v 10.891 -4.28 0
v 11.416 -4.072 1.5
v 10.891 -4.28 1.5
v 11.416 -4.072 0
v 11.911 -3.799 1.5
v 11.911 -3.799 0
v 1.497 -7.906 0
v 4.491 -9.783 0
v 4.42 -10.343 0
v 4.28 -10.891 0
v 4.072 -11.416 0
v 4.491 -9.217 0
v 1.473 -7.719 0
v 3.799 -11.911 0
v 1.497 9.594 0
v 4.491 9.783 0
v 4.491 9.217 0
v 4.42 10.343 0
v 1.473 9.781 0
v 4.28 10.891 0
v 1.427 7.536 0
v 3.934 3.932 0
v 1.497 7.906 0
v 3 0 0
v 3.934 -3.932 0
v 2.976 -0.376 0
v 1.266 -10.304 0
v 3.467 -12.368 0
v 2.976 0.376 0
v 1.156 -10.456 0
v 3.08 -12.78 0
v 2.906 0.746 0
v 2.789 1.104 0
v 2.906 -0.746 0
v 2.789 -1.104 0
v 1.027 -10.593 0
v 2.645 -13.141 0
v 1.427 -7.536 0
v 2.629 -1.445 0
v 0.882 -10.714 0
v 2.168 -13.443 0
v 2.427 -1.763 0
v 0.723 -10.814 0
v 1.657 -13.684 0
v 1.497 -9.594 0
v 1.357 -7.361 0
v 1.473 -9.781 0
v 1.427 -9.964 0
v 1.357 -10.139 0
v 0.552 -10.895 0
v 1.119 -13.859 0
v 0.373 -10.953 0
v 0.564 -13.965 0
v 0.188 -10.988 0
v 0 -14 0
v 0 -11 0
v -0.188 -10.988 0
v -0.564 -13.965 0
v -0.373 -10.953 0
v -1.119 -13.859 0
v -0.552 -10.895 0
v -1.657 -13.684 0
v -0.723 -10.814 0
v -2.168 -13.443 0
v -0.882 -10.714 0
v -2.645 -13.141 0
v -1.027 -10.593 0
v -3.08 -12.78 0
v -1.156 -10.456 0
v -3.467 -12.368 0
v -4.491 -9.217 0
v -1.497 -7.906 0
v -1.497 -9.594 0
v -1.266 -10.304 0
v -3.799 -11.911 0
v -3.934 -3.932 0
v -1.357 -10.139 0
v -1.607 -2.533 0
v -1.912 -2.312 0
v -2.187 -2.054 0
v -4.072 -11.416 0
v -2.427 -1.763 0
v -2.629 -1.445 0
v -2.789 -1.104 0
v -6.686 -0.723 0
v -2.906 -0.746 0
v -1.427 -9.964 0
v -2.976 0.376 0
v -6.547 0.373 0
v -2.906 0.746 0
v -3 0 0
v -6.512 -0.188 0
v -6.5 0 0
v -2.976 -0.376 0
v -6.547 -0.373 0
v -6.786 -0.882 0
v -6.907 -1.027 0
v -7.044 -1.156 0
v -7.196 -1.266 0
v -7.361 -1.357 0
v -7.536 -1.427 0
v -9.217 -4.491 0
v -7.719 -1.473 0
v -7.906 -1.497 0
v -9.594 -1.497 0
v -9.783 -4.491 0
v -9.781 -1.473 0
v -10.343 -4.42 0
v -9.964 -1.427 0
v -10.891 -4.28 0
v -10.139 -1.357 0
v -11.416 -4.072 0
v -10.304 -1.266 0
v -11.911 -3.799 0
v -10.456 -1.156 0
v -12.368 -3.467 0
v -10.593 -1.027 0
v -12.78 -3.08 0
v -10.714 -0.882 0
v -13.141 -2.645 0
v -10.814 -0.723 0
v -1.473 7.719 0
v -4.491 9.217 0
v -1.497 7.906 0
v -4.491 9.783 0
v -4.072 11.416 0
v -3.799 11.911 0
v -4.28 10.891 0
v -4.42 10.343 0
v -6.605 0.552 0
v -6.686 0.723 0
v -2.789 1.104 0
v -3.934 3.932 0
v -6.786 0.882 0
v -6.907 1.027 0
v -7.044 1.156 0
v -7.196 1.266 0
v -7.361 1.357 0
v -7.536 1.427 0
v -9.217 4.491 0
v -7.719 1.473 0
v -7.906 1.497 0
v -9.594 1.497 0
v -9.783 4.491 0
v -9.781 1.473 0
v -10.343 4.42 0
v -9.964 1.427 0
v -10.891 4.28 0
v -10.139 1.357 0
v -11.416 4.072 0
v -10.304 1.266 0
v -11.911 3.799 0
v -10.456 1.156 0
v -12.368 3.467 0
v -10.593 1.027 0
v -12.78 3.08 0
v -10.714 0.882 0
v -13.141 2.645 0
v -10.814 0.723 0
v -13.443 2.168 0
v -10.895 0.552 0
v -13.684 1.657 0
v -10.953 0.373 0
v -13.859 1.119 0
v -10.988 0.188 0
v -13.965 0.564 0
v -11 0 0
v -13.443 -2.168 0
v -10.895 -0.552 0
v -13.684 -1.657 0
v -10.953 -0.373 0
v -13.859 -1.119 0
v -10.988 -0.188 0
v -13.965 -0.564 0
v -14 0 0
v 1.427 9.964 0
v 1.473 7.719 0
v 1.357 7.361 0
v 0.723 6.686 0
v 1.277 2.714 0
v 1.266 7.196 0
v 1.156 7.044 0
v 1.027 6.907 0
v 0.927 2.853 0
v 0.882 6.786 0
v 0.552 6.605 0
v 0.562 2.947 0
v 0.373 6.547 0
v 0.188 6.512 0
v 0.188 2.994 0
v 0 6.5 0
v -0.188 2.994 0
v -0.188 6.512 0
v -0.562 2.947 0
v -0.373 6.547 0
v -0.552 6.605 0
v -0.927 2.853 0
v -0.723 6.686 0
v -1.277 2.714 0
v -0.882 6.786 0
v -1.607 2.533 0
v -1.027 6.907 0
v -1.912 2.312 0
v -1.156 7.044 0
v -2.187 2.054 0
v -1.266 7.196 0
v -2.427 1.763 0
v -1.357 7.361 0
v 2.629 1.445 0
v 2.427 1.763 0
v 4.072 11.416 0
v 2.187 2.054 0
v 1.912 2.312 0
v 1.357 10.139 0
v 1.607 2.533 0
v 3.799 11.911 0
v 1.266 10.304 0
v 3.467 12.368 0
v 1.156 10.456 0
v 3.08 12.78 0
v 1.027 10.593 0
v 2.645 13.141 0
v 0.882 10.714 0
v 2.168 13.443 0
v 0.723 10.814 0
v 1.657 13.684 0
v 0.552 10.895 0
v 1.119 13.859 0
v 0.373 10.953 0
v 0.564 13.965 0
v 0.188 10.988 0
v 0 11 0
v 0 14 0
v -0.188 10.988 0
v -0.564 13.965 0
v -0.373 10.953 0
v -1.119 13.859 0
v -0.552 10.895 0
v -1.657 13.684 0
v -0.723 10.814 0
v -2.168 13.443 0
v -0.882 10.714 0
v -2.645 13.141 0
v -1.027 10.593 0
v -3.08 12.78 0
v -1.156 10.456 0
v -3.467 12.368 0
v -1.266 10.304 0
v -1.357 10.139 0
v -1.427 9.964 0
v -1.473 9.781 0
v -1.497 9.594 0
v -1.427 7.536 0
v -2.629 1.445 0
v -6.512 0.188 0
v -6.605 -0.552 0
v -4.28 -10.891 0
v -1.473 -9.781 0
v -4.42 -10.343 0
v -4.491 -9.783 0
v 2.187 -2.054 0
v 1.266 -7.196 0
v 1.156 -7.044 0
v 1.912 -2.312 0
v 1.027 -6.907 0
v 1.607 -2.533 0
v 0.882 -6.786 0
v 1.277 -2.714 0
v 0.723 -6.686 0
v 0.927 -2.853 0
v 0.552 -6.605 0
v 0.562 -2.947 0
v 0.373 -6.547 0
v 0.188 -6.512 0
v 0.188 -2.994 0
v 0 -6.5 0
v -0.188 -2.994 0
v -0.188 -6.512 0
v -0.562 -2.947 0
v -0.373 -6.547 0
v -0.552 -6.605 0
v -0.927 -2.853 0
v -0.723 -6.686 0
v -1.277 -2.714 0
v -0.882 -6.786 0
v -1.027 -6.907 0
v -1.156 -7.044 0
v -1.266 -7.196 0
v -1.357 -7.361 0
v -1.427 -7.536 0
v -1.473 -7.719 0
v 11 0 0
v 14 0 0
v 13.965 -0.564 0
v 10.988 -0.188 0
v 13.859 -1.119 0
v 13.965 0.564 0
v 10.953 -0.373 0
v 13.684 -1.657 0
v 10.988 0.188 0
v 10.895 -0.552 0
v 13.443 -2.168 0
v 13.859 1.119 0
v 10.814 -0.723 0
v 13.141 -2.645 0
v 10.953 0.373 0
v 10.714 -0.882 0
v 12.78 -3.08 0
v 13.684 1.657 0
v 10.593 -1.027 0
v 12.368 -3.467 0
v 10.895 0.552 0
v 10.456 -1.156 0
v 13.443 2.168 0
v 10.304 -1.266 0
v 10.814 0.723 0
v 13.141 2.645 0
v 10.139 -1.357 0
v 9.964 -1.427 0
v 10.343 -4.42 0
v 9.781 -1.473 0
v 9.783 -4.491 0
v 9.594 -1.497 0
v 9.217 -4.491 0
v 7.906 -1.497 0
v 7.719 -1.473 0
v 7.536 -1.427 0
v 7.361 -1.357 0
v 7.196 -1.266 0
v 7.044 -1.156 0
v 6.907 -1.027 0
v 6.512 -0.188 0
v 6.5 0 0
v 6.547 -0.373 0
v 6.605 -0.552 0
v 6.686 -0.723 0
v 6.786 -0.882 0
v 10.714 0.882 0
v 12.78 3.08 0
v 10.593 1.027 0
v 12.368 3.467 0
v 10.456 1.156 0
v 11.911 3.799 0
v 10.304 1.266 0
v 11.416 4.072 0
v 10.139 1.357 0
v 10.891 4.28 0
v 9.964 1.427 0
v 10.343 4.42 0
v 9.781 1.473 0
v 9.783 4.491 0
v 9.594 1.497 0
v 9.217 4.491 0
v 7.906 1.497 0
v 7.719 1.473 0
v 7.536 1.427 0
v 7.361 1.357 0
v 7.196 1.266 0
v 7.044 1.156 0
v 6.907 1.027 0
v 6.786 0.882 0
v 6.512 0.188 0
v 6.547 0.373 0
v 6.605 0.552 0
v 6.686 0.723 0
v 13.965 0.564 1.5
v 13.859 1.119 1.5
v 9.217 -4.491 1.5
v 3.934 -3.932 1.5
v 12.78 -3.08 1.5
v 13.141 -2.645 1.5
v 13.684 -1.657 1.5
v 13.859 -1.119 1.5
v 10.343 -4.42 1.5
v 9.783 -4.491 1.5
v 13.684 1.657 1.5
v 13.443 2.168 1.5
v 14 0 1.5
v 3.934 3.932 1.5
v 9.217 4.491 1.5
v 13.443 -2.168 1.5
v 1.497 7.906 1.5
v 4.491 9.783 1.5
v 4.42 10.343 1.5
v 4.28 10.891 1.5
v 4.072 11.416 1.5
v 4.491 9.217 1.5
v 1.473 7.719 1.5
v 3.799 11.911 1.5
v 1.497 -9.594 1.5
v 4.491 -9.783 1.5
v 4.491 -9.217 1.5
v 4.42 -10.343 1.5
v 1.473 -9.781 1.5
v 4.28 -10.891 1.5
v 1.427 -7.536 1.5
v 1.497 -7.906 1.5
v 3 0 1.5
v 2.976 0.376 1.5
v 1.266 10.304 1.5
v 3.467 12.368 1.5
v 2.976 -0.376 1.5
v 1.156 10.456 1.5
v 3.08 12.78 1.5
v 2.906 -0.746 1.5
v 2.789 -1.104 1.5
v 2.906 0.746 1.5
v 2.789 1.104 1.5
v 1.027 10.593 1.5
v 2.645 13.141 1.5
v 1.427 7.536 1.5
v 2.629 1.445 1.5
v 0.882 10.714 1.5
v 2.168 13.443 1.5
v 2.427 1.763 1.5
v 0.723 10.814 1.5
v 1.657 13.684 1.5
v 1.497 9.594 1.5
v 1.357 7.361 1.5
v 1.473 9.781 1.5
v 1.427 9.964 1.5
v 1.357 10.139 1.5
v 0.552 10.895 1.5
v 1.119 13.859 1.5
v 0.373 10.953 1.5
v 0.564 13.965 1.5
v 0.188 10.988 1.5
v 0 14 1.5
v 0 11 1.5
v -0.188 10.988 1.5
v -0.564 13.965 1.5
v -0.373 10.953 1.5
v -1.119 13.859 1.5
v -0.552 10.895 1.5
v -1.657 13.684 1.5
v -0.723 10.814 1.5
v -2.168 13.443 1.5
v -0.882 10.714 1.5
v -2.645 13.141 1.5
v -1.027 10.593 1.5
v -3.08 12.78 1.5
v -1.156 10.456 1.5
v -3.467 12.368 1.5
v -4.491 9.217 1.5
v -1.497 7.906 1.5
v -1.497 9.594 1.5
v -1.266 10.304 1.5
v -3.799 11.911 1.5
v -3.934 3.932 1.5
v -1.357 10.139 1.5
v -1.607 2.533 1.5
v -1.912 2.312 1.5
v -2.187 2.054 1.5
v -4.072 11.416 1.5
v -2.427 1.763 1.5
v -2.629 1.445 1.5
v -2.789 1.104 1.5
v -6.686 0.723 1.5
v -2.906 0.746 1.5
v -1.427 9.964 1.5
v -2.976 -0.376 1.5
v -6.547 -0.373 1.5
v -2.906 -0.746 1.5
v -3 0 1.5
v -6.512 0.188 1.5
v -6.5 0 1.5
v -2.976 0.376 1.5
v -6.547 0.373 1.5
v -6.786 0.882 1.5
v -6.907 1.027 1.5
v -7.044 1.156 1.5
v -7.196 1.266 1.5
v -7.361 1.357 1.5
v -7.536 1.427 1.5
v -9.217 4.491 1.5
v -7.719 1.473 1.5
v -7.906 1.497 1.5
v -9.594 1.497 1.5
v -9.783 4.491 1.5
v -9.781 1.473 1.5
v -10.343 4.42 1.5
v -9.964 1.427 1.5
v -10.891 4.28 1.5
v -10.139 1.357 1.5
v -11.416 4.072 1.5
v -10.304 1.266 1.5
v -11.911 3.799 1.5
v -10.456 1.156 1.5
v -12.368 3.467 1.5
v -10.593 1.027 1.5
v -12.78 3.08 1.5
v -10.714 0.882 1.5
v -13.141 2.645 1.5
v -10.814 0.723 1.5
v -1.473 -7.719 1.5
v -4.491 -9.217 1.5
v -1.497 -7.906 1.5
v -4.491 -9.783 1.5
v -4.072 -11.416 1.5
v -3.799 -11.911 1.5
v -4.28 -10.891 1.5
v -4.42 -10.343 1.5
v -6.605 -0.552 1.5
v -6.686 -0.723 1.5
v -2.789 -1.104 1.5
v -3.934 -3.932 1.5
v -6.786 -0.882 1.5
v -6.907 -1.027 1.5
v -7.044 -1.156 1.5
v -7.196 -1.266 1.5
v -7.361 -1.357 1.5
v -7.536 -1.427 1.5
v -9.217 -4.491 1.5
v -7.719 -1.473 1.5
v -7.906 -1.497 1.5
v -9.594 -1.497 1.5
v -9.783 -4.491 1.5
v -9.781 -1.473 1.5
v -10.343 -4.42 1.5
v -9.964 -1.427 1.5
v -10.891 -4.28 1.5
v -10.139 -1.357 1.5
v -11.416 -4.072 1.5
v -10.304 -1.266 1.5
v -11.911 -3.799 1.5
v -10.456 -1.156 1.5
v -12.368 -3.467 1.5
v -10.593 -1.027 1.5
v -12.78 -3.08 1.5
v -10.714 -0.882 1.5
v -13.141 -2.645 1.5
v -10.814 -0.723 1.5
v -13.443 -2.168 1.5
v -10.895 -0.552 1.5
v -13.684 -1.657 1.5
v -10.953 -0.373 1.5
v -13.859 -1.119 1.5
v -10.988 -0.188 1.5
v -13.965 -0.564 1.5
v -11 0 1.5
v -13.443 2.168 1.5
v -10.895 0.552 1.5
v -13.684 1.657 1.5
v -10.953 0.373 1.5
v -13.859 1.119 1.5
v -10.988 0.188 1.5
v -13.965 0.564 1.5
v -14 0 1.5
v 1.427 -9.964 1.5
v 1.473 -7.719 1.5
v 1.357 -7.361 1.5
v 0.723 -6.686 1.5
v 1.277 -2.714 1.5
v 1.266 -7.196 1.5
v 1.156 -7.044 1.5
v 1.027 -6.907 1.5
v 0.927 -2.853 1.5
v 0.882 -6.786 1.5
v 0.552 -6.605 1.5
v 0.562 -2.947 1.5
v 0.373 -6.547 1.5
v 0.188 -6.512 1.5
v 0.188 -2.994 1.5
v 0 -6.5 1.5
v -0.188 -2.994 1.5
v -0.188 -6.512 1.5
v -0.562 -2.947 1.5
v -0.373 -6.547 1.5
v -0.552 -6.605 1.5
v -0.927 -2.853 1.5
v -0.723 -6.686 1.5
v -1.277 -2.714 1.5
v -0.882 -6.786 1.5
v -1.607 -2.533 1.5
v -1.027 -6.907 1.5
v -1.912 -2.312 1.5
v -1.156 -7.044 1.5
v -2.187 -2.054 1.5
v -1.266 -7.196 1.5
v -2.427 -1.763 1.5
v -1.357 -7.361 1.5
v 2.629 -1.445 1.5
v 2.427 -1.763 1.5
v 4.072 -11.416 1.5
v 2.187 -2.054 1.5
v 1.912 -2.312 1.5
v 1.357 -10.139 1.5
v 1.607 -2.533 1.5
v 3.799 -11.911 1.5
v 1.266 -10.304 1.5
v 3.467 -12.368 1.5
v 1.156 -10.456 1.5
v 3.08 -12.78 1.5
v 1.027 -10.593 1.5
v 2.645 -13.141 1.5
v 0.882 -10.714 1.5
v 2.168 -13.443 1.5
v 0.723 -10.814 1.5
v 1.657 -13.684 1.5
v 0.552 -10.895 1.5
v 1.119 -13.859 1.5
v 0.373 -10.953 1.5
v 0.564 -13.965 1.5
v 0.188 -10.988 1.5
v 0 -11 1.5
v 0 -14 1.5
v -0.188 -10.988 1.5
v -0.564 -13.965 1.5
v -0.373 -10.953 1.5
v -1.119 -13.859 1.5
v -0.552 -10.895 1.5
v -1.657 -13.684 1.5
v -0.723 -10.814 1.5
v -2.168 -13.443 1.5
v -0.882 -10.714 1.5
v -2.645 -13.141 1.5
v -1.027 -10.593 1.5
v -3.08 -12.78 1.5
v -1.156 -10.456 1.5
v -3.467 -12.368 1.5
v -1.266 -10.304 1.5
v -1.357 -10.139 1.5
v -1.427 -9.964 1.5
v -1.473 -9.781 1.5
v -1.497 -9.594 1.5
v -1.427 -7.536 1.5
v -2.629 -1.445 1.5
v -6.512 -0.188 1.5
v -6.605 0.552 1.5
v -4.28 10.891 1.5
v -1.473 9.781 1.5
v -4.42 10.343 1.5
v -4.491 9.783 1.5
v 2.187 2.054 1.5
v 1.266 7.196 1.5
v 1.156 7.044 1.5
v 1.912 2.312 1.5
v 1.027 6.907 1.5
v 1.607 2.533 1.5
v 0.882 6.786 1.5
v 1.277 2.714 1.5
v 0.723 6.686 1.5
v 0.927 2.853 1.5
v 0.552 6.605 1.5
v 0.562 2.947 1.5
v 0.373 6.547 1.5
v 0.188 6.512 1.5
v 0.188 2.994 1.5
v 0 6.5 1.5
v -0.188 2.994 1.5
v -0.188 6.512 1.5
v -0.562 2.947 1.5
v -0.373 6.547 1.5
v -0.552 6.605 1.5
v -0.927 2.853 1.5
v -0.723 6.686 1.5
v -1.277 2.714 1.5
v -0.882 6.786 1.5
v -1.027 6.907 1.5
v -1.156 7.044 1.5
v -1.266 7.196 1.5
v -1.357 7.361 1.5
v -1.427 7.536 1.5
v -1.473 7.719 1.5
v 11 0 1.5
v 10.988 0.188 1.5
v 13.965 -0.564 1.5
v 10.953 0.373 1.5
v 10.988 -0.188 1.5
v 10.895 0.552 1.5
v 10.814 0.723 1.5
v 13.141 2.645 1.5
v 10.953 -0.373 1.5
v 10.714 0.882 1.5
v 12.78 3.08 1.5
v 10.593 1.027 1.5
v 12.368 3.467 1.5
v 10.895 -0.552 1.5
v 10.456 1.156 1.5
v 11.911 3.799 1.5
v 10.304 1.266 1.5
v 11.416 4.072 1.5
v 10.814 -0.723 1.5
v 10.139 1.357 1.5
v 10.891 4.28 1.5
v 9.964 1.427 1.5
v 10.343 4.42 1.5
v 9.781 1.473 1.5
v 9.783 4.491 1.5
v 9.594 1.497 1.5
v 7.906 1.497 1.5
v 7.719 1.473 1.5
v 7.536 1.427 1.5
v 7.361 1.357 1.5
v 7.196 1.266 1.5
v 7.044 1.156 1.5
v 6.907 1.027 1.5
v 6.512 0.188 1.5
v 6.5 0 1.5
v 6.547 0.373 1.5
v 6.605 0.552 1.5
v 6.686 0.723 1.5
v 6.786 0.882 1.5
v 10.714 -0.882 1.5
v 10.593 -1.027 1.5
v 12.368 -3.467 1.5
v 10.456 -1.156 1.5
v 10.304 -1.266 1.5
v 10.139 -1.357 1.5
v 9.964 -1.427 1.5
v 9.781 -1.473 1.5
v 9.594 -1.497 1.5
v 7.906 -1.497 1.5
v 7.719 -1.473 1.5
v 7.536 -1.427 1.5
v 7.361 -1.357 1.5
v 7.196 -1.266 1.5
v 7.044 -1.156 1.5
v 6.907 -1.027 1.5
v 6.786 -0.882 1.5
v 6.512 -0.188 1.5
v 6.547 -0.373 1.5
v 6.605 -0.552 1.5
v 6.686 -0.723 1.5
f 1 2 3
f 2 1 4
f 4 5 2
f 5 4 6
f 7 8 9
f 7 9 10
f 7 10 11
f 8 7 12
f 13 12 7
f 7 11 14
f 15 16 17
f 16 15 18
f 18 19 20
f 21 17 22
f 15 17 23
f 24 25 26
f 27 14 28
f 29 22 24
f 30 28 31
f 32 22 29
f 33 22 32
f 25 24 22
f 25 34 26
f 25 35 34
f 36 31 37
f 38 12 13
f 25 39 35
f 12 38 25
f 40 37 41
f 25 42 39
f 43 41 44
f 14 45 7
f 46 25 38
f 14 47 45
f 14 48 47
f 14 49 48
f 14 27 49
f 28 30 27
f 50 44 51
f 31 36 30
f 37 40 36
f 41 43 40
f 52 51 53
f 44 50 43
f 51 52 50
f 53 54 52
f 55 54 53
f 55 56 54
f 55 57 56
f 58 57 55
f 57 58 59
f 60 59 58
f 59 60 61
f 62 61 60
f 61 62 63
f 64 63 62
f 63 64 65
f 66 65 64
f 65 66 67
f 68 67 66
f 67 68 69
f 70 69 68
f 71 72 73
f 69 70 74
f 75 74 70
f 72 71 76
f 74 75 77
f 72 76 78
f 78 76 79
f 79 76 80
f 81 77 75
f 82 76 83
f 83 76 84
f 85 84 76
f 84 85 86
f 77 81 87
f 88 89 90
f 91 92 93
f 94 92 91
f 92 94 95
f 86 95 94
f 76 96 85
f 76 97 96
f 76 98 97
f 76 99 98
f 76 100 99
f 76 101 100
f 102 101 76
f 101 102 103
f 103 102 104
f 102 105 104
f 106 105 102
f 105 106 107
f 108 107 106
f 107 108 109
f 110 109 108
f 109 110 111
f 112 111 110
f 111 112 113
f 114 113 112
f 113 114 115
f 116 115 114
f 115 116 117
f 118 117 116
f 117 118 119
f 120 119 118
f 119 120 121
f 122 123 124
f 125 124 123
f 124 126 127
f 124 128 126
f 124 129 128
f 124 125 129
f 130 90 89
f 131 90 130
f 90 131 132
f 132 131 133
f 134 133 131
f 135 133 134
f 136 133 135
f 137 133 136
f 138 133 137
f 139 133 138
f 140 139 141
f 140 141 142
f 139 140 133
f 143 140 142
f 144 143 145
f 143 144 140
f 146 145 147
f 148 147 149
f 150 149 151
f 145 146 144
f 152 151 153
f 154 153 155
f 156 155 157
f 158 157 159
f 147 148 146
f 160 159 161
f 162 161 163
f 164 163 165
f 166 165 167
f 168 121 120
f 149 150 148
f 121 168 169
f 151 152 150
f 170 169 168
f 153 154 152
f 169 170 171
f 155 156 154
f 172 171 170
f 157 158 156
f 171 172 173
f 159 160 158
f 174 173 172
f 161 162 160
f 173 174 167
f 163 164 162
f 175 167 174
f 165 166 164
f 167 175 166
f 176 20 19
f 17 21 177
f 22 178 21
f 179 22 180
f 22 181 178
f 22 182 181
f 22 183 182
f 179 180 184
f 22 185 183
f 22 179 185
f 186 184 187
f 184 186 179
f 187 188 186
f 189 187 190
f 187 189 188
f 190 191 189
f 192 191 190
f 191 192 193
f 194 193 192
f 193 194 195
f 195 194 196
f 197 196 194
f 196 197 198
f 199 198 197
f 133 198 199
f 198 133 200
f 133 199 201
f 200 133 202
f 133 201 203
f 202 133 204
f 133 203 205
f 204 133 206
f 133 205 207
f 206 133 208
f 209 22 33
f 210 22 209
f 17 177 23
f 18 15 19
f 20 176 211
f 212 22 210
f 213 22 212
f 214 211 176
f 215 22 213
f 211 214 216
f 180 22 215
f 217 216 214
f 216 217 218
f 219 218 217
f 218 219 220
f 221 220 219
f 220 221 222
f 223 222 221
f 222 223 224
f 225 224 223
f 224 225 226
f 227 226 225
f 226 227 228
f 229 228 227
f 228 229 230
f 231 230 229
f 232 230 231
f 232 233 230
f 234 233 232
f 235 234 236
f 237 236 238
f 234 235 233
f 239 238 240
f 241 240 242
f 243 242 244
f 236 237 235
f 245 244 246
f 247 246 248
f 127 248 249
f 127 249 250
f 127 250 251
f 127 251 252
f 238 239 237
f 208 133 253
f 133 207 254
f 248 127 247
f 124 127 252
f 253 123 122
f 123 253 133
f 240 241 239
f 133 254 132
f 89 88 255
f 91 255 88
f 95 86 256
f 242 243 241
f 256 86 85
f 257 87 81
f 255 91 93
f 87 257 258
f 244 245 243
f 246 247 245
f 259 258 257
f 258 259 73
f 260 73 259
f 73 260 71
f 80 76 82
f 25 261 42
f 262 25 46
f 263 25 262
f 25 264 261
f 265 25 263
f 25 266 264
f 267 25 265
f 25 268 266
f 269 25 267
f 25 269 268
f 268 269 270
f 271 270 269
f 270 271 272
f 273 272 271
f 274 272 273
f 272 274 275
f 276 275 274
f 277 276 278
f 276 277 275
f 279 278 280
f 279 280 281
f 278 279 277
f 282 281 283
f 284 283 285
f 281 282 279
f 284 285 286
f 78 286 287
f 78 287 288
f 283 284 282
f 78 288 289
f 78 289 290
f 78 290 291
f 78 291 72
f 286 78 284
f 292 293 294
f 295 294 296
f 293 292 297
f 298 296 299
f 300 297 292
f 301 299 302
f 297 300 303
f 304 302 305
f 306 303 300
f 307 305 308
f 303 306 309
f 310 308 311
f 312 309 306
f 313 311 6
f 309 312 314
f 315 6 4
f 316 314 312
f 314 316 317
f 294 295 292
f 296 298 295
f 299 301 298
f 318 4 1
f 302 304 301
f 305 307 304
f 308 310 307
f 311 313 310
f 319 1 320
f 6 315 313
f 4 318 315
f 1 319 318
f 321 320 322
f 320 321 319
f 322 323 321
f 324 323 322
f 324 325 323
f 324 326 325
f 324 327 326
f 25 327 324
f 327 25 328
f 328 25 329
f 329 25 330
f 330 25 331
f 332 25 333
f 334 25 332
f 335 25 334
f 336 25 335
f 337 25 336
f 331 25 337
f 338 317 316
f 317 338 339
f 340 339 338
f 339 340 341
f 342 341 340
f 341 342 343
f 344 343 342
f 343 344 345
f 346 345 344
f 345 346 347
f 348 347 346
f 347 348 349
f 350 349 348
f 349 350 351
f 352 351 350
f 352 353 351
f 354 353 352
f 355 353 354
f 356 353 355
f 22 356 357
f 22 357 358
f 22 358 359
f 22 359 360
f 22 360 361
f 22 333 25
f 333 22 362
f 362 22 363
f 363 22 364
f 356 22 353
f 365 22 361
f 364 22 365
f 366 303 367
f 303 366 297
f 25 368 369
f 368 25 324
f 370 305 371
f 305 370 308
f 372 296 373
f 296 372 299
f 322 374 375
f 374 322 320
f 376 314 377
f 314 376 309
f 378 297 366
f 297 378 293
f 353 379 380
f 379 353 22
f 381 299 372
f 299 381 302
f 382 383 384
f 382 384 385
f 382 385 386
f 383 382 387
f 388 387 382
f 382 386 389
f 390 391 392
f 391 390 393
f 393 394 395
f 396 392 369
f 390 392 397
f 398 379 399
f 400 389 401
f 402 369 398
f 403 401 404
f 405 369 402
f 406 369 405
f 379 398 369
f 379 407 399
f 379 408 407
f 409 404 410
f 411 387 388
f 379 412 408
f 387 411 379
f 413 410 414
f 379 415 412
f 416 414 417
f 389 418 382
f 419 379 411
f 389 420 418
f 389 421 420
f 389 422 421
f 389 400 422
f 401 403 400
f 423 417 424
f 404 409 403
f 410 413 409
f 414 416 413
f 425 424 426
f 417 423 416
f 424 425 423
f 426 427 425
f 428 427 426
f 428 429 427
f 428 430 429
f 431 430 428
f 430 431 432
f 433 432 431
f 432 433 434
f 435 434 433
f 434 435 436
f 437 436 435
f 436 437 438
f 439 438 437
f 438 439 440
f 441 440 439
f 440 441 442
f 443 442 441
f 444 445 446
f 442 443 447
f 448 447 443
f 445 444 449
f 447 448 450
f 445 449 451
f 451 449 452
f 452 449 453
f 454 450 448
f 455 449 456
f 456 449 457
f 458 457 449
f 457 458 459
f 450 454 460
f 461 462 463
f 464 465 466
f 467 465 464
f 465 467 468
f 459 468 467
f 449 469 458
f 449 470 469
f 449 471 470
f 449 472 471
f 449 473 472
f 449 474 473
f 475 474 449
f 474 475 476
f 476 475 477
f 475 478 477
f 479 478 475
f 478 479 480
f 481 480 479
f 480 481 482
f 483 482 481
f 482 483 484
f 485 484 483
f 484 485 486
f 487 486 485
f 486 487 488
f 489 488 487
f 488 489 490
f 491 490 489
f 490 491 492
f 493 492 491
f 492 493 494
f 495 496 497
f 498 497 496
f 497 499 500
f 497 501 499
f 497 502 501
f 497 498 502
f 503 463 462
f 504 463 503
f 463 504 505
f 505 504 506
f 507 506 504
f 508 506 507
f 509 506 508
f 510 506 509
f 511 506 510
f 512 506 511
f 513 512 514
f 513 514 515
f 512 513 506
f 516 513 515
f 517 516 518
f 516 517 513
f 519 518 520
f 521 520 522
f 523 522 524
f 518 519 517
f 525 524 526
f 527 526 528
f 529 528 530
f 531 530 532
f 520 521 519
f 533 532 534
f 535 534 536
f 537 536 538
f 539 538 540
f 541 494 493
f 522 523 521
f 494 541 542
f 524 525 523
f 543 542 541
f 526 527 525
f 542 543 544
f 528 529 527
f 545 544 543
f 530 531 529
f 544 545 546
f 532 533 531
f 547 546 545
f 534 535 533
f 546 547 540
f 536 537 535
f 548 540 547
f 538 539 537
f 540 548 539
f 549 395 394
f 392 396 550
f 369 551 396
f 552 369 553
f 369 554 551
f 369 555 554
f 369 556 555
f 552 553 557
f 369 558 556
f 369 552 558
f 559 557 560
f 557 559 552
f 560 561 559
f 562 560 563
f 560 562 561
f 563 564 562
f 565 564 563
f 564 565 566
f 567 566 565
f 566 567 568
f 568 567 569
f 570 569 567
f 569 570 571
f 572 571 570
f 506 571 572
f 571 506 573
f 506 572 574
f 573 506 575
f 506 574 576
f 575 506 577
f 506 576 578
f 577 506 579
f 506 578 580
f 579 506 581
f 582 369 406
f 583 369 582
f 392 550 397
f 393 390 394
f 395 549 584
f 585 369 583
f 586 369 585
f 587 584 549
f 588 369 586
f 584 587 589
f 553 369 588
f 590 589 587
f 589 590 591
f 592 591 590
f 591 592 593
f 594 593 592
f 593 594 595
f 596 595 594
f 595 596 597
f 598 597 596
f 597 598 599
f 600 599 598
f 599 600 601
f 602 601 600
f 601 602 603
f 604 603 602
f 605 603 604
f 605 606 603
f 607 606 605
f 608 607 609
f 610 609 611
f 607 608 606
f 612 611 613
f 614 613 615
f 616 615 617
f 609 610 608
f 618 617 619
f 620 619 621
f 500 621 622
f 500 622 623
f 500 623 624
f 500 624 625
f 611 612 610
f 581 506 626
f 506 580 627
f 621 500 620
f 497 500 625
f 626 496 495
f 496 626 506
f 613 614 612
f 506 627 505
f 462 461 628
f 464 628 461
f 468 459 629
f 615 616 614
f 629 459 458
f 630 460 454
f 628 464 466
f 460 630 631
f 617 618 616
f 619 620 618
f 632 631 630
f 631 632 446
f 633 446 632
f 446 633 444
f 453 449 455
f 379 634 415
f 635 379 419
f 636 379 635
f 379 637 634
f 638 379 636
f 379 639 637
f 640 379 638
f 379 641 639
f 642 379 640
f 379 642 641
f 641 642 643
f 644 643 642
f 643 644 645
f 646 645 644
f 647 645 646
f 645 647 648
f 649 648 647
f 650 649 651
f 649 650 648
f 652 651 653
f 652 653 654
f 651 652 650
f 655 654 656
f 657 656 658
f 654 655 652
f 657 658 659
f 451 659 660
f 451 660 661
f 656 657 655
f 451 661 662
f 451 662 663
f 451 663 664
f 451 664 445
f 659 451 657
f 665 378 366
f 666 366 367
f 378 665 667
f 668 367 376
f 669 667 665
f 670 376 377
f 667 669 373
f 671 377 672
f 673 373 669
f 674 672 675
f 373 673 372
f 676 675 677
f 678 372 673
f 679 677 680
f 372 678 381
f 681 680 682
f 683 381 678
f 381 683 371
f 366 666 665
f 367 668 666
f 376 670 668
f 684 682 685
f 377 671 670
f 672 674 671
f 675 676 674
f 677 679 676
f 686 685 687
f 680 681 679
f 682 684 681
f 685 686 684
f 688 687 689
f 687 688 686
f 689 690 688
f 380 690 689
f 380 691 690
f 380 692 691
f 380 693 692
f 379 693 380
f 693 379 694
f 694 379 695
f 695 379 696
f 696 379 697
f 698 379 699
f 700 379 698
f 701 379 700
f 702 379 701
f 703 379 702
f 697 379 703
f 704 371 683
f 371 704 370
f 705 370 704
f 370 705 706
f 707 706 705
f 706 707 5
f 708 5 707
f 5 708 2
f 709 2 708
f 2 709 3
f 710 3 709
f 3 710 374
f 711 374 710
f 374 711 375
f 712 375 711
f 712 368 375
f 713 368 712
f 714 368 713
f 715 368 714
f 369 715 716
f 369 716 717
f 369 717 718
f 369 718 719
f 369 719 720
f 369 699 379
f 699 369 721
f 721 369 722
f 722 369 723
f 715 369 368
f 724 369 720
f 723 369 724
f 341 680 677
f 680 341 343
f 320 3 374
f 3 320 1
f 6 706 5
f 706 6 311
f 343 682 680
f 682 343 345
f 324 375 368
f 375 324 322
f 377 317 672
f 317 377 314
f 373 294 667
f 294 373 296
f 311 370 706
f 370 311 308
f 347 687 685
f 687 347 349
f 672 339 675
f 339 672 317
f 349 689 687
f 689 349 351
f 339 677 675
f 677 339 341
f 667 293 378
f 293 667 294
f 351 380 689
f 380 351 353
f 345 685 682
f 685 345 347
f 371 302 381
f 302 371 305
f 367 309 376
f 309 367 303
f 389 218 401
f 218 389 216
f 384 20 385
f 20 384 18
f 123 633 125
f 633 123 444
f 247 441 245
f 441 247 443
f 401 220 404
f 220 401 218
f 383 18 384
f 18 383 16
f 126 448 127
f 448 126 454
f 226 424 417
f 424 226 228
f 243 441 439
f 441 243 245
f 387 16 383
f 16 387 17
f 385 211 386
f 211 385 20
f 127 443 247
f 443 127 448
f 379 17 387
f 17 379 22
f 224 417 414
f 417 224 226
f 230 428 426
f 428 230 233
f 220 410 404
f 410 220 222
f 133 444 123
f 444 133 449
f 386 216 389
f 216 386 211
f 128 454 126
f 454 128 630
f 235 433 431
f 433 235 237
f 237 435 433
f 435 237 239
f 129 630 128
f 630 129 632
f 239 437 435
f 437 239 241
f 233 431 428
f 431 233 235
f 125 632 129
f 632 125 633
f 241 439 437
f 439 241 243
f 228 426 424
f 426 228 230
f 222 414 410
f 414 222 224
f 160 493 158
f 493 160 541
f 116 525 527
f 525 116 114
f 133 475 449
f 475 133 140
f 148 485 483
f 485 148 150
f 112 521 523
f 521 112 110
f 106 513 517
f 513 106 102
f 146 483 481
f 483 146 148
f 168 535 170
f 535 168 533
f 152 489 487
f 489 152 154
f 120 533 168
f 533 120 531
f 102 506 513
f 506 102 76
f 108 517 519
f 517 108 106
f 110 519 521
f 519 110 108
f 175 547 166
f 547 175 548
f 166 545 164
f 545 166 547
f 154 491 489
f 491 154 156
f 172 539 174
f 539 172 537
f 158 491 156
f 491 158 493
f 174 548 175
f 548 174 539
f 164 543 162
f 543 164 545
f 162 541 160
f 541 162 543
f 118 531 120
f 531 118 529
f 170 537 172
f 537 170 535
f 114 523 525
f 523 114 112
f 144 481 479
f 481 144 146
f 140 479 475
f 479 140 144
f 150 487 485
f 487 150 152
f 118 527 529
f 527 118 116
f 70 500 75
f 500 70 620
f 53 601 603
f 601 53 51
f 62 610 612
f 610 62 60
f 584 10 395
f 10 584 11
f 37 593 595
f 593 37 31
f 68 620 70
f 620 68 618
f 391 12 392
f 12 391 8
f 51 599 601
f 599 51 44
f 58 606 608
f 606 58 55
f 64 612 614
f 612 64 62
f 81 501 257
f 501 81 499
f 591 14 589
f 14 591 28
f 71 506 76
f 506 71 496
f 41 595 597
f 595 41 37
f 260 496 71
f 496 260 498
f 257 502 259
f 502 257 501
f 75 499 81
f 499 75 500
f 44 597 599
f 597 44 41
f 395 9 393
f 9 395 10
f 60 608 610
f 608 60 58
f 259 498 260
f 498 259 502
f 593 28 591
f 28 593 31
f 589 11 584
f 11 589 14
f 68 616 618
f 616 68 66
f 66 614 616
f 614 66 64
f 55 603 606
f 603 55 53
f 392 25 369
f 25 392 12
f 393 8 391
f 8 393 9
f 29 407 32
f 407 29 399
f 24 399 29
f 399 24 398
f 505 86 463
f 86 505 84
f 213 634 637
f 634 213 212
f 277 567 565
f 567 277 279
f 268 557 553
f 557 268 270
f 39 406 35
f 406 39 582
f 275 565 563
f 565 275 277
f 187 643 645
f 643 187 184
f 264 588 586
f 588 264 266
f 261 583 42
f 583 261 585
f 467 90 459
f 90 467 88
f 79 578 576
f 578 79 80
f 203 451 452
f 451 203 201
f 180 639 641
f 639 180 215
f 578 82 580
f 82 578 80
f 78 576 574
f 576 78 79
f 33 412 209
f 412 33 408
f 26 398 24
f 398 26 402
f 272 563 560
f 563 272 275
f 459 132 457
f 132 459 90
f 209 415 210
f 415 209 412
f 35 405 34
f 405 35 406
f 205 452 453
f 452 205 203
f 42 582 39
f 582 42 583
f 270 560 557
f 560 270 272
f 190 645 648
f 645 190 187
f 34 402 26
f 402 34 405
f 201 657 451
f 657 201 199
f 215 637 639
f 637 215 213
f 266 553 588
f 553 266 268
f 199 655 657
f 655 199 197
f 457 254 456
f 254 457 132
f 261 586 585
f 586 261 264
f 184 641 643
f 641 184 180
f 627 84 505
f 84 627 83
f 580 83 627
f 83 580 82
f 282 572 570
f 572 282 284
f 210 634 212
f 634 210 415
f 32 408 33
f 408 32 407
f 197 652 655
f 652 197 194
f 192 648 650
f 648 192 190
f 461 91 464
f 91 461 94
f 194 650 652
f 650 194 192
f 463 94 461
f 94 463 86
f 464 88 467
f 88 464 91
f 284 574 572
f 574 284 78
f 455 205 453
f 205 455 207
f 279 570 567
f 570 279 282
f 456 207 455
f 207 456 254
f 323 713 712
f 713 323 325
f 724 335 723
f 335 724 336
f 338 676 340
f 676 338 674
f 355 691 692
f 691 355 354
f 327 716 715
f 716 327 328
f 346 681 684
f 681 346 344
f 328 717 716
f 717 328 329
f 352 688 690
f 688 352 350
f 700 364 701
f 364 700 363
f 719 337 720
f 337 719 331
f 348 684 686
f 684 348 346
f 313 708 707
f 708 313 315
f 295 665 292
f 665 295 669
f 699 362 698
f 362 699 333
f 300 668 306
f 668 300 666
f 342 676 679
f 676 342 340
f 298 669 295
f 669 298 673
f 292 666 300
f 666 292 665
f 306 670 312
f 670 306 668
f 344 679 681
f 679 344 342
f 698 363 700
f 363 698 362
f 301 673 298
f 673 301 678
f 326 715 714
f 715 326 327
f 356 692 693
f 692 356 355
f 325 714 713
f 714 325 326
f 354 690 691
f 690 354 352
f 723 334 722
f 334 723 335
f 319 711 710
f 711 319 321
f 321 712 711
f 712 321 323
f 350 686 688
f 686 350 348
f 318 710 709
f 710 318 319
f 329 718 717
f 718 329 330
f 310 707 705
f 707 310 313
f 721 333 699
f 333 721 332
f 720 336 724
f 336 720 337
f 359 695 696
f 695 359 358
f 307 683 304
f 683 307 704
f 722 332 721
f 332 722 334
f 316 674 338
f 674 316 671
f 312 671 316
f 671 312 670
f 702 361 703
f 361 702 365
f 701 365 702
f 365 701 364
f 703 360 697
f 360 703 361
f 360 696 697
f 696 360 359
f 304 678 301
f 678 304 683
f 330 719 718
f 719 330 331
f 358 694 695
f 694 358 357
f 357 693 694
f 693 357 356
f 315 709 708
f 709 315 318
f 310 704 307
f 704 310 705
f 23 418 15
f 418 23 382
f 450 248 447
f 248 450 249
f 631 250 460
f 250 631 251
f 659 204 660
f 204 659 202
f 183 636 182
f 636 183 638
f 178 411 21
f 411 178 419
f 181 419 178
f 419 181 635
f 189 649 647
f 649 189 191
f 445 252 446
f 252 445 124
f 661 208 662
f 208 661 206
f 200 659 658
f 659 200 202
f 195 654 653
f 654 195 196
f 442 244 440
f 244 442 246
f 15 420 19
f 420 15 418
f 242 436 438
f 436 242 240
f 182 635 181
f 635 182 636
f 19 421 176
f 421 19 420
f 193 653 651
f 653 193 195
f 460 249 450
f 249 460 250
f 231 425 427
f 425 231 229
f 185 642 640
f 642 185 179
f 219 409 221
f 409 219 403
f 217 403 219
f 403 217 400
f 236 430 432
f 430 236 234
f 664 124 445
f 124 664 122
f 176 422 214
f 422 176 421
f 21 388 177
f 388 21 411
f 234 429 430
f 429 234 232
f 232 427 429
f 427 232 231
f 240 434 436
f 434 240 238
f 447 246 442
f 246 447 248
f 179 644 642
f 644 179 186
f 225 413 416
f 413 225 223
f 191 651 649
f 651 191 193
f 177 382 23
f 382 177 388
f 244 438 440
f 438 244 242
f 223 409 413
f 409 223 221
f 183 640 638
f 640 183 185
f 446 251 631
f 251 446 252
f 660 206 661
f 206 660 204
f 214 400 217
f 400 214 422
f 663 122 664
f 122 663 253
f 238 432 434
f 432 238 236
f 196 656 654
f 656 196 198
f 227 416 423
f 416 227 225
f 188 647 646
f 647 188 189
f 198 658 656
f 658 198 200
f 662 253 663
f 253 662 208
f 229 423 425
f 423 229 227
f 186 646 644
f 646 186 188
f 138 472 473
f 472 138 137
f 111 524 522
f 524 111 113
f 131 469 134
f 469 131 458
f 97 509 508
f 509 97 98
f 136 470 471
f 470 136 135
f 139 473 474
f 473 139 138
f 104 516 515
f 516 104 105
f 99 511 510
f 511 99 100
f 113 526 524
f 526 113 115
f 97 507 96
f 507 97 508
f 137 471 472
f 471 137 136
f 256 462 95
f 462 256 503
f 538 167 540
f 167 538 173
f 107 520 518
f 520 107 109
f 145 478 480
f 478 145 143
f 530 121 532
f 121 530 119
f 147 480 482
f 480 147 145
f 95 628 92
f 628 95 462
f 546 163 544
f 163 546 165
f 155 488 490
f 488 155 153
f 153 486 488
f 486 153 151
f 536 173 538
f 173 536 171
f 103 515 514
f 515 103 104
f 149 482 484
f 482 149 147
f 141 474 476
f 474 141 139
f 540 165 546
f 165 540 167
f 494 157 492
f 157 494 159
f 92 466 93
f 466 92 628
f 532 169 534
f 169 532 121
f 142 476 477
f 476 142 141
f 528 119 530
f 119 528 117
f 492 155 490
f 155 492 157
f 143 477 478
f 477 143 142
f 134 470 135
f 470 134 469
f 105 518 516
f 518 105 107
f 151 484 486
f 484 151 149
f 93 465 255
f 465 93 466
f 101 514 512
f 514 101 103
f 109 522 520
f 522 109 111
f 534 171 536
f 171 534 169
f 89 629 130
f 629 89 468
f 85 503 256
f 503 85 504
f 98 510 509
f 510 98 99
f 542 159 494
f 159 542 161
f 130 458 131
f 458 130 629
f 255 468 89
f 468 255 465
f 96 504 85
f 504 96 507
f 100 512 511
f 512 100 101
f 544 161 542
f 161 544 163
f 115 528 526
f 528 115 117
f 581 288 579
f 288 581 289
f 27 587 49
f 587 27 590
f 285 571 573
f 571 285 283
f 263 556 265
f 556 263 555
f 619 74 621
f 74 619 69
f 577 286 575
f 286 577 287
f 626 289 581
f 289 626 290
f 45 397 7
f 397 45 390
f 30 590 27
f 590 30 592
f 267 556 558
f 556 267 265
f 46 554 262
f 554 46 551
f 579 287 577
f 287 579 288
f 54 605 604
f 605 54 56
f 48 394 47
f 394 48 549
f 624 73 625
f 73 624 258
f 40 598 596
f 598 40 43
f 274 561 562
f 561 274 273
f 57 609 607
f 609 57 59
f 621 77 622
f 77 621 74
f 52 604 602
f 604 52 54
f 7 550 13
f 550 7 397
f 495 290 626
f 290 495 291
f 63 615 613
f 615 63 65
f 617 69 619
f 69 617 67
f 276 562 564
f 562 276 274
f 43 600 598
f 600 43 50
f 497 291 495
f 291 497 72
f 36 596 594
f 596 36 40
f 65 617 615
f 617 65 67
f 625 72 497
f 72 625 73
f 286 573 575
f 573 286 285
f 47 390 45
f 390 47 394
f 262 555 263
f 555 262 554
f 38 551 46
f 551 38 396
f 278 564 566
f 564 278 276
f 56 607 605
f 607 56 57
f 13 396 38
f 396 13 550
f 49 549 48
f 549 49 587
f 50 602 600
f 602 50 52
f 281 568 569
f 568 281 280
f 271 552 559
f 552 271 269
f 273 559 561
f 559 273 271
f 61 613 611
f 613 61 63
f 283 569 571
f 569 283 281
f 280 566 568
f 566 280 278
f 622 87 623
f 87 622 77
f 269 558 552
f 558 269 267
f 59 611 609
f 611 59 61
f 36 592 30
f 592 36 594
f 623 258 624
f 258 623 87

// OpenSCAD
// Diameter of the center element
centerDiameter = 7;
// DIameter of the hole in the center (this should be smaller than centerDiameter)
centerHoleDiameter = 6;

// Walls around the screw hole/slot
walls = 3;

// Diameter of the screw hole/slot
screwHoleDiameter = 3;

// Max spacing between the screw holes
outerScrewDiameter = 19;
// Min spacing between the screw holes
innerScrewDiameter = 16;

// Height of the pad
height = 1.5;

// Shape of the pad
shape = "cross"; // [cross, cricle]

/* [Hidden] */
$fn = 50;
centerHoleRadius = centerHoleDiameter / 2;
centerRadius = centerDiameter / 2;

screwHoleRadius = screwHoleDiameter / 2;

outerRadius = screwHoleRadius + walls; //outerDiameter / 2;

screwHoleOffset = outerScrewDiameter / 2;

screwHoleLength = (outerScrewDiameter - innerScrewDiameter) / 2;

module shape() {
  group() {
    if(shape == "cross") {
      for(a = [0:90:360])
        hull() {
          cylinder(r = centerRadius, h = height);
          rotate([0, 0, a])
            translate([screwHoleOffset, 0, 0])
              cylinder(r = outerRadius, h = height);
        }
    } else {
      cylinder(r = screwHoleOffset + screwHoleRadius + walls, h = height);
    }
  }  
}

difference() {
  shape();

  for(a = [0:90:360])
    translate([0, 0, -1]) {
      cylinder(r = centerHoleRadius, h = height + 2);
      
      rotate([0, 0, a]) {
        translate([screwHoleOffset, 0, 0]) {
          hull() {
            cylinder(r = screwHoleRadius, h = height + 2);
            translate([-screwHoleLength, 0, 0])
              cylinder(r = screwHoleRadius, h = height + 2);
          }
        }
      }
    }
}
